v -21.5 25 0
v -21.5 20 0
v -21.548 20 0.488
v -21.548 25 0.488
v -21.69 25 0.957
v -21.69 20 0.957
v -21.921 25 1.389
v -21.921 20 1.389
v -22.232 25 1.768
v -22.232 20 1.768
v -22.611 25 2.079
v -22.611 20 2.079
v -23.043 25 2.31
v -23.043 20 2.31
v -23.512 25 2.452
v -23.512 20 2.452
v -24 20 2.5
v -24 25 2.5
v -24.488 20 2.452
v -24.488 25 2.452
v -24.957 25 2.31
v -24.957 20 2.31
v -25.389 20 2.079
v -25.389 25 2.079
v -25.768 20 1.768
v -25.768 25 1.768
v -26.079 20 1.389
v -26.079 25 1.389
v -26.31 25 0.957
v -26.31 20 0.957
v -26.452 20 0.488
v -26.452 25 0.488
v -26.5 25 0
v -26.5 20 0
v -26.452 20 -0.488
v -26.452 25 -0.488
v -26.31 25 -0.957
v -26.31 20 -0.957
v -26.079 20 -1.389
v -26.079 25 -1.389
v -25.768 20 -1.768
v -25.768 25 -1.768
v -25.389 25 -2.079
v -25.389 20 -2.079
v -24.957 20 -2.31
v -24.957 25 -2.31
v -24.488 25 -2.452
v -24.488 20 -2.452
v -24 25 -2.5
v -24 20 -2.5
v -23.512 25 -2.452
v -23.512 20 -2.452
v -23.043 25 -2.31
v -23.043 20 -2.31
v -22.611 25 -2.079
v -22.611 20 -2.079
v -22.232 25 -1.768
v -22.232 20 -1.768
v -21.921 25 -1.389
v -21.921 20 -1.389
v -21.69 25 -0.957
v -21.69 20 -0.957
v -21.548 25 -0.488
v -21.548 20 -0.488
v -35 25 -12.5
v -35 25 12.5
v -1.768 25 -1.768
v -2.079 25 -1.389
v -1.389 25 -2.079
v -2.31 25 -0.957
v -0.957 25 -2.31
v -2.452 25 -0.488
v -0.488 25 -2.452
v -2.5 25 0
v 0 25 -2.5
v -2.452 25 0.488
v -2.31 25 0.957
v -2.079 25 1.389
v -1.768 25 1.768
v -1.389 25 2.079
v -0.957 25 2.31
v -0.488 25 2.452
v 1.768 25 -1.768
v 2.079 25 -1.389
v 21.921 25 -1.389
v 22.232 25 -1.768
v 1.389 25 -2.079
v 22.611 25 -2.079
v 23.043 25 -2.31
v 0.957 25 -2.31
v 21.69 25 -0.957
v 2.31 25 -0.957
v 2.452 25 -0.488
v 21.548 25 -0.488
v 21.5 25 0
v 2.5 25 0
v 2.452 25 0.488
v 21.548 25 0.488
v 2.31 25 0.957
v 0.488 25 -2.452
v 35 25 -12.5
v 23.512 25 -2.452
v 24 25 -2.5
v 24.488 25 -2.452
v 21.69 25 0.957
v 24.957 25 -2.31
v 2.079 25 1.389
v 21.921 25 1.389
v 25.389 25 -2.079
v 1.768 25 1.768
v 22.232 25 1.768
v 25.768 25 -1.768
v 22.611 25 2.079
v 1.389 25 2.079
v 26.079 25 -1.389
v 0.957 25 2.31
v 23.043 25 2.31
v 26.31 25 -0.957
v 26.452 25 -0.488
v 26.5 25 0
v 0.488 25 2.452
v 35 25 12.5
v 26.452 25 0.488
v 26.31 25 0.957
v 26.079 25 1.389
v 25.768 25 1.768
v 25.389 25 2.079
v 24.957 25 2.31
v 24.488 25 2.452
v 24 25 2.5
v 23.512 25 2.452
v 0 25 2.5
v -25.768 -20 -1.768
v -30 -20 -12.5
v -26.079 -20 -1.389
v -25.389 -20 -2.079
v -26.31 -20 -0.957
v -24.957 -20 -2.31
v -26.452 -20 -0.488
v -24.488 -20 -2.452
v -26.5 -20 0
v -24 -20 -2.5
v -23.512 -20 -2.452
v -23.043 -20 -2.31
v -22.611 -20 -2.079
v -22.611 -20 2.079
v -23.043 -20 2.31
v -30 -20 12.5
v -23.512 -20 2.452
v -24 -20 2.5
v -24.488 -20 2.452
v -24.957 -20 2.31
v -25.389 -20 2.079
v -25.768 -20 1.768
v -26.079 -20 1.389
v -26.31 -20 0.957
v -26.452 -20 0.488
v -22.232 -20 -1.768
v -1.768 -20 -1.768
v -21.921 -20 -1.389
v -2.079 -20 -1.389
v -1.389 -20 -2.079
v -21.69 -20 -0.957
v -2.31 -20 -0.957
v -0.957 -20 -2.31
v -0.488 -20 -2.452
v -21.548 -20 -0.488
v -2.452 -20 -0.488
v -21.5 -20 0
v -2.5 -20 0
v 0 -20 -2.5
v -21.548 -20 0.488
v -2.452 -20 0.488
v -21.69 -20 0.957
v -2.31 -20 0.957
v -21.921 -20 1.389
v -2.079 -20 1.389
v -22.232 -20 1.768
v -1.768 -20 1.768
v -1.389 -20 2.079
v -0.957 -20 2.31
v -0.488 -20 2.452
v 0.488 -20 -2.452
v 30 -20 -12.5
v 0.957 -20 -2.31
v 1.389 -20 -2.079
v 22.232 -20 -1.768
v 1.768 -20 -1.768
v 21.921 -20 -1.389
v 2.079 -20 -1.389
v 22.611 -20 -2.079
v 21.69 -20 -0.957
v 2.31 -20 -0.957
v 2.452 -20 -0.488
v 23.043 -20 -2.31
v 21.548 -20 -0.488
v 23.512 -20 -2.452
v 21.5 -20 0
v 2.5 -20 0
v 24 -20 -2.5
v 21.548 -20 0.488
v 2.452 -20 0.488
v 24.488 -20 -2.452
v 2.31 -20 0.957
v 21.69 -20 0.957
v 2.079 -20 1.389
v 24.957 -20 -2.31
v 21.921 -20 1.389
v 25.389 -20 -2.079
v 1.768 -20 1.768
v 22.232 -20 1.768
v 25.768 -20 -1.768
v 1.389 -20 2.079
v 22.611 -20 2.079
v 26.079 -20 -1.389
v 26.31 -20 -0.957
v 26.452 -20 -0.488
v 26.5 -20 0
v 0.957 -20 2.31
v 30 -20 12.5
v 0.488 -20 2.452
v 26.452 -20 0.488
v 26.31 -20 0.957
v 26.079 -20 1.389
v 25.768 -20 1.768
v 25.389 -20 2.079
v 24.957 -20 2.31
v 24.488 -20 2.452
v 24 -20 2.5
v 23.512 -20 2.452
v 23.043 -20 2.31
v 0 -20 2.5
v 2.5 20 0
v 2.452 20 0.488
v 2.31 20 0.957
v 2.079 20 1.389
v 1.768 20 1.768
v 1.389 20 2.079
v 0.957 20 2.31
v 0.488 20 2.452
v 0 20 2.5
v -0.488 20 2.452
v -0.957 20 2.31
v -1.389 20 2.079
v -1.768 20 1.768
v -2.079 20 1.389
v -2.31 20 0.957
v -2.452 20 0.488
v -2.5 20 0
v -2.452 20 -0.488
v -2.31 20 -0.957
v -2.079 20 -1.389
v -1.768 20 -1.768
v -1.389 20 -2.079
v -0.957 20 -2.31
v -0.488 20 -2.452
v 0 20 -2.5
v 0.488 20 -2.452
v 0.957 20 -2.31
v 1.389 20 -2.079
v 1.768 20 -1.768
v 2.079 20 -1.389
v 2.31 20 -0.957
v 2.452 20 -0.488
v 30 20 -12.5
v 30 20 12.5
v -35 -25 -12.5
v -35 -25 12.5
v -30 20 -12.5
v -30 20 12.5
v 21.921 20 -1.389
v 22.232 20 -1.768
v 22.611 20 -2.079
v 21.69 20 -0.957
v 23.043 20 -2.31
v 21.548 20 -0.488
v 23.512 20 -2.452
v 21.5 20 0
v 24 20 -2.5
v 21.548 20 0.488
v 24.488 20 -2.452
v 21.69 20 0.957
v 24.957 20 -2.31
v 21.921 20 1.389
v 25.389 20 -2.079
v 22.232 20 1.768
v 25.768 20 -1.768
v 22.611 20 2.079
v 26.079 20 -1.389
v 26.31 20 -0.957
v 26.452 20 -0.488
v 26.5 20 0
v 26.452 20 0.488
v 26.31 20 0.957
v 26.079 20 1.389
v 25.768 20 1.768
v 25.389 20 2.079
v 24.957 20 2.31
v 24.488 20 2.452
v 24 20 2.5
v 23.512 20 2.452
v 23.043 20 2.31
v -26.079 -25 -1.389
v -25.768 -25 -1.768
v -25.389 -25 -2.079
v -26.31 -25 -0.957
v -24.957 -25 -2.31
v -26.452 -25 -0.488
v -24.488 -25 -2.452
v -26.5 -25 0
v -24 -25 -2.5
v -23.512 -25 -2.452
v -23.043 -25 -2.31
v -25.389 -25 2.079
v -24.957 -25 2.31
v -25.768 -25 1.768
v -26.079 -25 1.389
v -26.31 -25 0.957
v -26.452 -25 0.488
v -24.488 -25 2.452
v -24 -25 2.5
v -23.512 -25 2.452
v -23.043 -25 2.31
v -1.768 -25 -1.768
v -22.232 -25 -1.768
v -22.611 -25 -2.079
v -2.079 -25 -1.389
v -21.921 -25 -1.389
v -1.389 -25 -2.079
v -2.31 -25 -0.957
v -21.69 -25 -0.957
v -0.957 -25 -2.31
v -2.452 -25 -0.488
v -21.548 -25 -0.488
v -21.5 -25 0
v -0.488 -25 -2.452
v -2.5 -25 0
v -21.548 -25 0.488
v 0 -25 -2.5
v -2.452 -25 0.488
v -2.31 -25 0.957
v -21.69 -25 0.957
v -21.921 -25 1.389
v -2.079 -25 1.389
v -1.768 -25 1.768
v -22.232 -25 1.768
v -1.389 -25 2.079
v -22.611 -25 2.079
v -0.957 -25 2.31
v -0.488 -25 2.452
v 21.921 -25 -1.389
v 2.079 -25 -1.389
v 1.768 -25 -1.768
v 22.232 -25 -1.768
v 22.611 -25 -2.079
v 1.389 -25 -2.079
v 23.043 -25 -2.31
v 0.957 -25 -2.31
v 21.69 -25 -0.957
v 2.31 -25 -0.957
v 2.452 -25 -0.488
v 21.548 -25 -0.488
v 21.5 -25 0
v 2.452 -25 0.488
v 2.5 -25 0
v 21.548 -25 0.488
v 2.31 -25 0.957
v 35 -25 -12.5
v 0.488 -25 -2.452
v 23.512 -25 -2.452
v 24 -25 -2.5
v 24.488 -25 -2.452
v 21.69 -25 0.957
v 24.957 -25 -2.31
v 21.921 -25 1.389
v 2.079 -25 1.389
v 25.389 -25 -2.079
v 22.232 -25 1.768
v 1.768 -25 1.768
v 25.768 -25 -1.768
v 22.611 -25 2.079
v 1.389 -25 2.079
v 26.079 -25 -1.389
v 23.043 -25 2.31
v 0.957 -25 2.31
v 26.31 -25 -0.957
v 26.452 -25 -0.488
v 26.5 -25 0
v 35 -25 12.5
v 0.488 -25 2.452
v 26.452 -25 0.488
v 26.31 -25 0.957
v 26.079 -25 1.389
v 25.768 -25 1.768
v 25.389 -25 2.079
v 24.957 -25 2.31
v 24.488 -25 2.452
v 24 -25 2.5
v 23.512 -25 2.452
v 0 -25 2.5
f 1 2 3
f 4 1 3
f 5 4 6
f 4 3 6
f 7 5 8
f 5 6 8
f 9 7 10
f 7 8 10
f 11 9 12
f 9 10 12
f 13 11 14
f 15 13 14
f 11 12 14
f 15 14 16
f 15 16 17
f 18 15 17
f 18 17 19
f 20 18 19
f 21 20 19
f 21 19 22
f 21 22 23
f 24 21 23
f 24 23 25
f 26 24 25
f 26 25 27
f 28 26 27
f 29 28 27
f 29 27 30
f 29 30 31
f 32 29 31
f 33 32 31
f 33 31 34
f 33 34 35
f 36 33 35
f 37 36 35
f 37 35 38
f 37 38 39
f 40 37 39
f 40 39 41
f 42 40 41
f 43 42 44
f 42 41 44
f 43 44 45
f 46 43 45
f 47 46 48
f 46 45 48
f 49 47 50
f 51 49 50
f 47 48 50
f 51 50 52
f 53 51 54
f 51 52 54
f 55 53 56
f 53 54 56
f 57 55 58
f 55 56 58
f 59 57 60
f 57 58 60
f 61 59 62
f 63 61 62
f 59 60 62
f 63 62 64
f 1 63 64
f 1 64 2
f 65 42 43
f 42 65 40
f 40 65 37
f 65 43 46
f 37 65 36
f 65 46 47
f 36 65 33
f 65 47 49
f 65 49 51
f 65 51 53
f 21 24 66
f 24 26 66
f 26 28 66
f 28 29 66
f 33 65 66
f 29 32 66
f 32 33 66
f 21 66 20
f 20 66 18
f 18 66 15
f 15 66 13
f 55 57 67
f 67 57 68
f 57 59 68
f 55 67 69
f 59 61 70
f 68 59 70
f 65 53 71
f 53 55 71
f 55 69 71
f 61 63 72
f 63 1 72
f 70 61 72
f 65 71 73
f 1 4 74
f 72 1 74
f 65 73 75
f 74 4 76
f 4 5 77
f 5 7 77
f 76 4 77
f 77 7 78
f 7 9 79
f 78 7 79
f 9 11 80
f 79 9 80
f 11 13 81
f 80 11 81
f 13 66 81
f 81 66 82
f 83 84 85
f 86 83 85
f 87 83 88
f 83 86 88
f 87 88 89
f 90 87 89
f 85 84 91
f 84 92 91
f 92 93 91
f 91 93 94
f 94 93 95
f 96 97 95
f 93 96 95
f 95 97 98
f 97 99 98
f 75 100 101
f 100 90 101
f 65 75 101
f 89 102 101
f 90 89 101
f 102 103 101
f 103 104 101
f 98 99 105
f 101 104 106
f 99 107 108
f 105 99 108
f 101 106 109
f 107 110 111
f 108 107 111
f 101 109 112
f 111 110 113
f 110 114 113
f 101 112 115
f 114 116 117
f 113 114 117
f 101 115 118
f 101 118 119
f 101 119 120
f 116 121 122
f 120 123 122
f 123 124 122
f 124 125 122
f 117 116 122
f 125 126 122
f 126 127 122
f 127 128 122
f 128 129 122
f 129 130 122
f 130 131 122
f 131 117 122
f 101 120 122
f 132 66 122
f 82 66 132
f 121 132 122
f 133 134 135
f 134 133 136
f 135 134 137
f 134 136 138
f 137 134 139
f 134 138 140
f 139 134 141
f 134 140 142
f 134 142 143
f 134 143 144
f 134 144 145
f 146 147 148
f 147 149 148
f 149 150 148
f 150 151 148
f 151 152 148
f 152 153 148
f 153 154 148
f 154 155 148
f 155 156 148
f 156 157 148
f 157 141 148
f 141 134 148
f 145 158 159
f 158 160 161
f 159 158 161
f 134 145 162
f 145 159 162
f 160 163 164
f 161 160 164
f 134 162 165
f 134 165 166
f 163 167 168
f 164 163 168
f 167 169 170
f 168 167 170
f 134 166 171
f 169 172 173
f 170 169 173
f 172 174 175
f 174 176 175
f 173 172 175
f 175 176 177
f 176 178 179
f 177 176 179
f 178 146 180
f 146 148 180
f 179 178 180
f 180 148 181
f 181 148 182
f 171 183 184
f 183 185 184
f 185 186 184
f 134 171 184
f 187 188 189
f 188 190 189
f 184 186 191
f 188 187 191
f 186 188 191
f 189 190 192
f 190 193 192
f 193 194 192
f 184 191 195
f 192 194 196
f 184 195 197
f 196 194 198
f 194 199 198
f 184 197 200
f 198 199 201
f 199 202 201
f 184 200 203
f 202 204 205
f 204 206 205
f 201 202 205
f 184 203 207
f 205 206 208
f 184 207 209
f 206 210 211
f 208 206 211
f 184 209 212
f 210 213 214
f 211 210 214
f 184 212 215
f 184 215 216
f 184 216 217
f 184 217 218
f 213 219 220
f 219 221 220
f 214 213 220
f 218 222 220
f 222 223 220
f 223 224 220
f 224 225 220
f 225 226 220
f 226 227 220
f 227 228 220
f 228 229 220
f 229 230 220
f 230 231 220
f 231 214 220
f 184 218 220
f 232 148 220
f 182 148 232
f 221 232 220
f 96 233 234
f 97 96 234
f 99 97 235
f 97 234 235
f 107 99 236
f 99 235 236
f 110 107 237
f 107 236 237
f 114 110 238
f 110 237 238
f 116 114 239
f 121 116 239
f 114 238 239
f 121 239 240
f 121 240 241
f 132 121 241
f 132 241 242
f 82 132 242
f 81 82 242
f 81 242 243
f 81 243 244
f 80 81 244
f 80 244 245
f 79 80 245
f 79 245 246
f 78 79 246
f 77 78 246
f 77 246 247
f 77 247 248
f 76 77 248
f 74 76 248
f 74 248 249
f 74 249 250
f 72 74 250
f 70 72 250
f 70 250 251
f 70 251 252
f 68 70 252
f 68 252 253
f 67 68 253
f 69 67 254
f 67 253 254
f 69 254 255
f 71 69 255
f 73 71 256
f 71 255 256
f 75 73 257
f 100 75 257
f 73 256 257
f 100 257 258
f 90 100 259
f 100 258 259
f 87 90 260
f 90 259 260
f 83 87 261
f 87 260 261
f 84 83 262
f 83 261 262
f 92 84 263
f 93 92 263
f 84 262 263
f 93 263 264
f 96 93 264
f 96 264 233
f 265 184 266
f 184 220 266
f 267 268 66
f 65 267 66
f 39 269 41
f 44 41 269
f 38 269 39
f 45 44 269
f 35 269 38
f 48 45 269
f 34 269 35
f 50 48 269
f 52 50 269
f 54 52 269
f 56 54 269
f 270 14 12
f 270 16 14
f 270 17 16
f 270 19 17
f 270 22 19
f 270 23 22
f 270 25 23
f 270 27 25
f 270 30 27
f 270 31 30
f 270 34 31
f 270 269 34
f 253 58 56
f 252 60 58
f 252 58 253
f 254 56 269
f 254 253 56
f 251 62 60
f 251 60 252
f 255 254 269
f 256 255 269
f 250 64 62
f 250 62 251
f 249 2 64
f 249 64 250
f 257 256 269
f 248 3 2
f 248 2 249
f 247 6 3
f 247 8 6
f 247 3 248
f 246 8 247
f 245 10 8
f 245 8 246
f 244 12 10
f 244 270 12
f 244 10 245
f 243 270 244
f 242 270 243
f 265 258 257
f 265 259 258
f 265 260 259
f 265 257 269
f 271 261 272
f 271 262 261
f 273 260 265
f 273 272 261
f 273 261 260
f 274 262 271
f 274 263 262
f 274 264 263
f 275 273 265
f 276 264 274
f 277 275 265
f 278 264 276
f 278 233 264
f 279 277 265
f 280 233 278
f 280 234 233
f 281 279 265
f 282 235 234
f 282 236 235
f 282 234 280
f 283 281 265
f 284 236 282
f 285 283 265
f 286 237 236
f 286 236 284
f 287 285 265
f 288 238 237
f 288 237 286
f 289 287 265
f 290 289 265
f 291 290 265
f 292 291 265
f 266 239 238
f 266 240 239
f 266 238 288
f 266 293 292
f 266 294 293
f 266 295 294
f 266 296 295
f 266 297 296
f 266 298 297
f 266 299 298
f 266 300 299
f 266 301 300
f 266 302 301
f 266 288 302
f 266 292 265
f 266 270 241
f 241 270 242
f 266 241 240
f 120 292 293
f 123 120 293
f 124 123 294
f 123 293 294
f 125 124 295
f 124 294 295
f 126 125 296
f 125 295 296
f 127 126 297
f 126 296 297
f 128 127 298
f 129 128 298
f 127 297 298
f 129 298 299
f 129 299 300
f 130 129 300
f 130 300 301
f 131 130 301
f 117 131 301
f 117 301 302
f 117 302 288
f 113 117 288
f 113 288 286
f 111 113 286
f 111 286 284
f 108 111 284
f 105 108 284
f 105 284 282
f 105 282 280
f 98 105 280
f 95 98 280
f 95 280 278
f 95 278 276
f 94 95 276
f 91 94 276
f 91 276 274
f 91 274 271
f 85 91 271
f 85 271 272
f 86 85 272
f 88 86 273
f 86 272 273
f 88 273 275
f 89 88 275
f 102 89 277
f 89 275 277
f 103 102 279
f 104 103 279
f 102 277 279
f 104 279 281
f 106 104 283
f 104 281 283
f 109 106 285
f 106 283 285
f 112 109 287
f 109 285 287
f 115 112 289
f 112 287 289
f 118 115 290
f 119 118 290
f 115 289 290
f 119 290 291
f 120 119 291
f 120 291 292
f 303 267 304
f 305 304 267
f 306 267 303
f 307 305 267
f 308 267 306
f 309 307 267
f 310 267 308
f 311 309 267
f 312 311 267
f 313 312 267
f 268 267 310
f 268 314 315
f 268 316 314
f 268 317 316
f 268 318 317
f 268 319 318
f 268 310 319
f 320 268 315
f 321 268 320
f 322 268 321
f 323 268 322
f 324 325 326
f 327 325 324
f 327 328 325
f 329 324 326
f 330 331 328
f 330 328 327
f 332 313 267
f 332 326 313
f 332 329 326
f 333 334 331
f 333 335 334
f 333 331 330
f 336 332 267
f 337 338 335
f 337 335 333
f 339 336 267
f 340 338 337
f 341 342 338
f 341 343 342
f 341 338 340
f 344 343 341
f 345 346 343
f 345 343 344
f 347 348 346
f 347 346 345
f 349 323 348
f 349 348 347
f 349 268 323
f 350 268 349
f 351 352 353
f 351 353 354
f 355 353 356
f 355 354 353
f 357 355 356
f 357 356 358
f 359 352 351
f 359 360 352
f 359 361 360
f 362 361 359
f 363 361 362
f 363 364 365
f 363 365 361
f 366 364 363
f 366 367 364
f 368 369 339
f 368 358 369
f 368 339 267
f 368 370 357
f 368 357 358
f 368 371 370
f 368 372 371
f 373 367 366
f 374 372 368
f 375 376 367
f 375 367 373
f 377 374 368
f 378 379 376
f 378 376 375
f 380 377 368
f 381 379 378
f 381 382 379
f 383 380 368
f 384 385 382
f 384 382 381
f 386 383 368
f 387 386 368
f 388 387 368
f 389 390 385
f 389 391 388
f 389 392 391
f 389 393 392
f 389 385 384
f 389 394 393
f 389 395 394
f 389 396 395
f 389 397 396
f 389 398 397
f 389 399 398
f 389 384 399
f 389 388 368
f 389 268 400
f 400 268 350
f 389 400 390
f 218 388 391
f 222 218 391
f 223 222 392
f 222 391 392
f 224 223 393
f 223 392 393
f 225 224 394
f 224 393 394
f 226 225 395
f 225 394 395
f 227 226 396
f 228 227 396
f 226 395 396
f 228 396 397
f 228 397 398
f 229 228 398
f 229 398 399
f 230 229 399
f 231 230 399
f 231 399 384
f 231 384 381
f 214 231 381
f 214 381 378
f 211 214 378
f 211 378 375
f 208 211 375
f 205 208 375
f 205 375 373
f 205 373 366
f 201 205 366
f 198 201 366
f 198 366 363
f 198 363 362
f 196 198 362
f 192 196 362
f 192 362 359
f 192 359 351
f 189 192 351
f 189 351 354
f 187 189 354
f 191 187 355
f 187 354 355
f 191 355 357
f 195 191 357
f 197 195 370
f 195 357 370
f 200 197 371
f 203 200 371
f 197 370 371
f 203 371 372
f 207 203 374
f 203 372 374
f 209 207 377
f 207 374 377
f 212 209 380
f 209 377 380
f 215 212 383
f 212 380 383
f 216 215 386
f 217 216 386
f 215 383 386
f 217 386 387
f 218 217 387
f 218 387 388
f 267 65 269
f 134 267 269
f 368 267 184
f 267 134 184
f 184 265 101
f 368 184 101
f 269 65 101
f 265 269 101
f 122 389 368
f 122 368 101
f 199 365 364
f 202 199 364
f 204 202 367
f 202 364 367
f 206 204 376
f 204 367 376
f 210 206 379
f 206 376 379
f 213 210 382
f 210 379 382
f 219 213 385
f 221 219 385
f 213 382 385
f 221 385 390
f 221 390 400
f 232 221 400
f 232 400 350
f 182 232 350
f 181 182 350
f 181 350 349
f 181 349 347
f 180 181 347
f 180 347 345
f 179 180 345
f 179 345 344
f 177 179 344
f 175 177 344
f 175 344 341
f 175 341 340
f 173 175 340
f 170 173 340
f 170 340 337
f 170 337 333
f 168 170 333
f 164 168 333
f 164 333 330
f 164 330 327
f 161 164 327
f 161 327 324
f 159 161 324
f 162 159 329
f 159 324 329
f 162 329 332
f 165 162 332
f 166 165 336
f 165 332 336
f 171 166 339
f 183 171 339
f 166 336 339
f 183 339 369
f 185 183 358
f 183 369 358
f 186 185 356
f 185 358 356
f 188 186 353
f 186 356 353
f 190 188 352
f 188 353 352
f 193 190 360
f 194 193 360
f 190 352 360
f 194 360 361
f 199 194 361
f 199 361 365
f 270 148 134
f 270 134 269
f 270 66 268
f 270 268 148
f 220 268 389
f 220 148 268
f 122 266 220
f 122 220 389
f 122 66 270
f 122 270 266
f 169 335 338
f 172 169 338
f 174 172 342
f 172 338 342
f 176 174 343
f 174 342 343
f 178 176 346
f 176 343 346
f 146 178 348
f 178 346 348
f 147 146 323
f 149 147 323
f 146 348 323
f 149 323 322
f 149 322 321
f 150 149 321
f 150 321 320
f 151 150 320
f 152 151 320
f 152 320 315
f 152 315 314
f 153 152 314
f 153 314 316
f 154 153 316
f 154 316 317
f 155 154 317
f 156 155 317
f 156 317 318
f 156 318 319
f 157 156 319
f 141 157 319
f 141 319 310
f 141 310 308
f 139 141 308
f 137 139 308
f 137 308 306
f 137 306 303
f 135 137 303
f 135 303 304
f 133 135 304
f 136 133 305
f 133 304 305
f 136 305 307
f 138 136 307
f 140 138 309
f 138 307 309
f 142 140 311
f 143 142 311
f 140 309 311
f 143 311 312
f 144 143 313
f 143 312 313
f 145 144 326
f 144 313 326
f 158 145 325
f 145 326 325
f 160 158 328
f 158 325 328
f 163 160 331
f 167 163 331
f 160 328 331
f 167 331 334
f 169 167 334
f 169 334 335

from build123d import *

# Parameters (mm, degrees)
F0_W     = 70
F0_H     = 50
F0_W_2   = 60
F0_H_2   = 40
F1_DEPTH = 12.5
F2_R     = 2.5
F3_DEPTH = 50.001


with BuildPart() as f1:
    # F0 (on Top) → F1 (new body, symmetric)
    with BuildSketch(Plane.XY):
        Rectangle(F0_W, F0_H)
        Rectangle(F0_W_2, F0_H_2, mode=Mode.SUBTRACT)
    extrude(amount=F1_DEPTH, both=True)

    # F2 (on face) → F3 (cut, through all)
    with BuildSketch(Plane.XZ.offset(25)):
        with Locations((-24, 0)):
            Circle(F2_R)
        Circle(F2_R)
        with Locations((24, 0)):
            Circle(F2_R)
    extrude(amount=-F3_DEPTH, mode=Mode.SUBTRACT)


solid = f1.part
